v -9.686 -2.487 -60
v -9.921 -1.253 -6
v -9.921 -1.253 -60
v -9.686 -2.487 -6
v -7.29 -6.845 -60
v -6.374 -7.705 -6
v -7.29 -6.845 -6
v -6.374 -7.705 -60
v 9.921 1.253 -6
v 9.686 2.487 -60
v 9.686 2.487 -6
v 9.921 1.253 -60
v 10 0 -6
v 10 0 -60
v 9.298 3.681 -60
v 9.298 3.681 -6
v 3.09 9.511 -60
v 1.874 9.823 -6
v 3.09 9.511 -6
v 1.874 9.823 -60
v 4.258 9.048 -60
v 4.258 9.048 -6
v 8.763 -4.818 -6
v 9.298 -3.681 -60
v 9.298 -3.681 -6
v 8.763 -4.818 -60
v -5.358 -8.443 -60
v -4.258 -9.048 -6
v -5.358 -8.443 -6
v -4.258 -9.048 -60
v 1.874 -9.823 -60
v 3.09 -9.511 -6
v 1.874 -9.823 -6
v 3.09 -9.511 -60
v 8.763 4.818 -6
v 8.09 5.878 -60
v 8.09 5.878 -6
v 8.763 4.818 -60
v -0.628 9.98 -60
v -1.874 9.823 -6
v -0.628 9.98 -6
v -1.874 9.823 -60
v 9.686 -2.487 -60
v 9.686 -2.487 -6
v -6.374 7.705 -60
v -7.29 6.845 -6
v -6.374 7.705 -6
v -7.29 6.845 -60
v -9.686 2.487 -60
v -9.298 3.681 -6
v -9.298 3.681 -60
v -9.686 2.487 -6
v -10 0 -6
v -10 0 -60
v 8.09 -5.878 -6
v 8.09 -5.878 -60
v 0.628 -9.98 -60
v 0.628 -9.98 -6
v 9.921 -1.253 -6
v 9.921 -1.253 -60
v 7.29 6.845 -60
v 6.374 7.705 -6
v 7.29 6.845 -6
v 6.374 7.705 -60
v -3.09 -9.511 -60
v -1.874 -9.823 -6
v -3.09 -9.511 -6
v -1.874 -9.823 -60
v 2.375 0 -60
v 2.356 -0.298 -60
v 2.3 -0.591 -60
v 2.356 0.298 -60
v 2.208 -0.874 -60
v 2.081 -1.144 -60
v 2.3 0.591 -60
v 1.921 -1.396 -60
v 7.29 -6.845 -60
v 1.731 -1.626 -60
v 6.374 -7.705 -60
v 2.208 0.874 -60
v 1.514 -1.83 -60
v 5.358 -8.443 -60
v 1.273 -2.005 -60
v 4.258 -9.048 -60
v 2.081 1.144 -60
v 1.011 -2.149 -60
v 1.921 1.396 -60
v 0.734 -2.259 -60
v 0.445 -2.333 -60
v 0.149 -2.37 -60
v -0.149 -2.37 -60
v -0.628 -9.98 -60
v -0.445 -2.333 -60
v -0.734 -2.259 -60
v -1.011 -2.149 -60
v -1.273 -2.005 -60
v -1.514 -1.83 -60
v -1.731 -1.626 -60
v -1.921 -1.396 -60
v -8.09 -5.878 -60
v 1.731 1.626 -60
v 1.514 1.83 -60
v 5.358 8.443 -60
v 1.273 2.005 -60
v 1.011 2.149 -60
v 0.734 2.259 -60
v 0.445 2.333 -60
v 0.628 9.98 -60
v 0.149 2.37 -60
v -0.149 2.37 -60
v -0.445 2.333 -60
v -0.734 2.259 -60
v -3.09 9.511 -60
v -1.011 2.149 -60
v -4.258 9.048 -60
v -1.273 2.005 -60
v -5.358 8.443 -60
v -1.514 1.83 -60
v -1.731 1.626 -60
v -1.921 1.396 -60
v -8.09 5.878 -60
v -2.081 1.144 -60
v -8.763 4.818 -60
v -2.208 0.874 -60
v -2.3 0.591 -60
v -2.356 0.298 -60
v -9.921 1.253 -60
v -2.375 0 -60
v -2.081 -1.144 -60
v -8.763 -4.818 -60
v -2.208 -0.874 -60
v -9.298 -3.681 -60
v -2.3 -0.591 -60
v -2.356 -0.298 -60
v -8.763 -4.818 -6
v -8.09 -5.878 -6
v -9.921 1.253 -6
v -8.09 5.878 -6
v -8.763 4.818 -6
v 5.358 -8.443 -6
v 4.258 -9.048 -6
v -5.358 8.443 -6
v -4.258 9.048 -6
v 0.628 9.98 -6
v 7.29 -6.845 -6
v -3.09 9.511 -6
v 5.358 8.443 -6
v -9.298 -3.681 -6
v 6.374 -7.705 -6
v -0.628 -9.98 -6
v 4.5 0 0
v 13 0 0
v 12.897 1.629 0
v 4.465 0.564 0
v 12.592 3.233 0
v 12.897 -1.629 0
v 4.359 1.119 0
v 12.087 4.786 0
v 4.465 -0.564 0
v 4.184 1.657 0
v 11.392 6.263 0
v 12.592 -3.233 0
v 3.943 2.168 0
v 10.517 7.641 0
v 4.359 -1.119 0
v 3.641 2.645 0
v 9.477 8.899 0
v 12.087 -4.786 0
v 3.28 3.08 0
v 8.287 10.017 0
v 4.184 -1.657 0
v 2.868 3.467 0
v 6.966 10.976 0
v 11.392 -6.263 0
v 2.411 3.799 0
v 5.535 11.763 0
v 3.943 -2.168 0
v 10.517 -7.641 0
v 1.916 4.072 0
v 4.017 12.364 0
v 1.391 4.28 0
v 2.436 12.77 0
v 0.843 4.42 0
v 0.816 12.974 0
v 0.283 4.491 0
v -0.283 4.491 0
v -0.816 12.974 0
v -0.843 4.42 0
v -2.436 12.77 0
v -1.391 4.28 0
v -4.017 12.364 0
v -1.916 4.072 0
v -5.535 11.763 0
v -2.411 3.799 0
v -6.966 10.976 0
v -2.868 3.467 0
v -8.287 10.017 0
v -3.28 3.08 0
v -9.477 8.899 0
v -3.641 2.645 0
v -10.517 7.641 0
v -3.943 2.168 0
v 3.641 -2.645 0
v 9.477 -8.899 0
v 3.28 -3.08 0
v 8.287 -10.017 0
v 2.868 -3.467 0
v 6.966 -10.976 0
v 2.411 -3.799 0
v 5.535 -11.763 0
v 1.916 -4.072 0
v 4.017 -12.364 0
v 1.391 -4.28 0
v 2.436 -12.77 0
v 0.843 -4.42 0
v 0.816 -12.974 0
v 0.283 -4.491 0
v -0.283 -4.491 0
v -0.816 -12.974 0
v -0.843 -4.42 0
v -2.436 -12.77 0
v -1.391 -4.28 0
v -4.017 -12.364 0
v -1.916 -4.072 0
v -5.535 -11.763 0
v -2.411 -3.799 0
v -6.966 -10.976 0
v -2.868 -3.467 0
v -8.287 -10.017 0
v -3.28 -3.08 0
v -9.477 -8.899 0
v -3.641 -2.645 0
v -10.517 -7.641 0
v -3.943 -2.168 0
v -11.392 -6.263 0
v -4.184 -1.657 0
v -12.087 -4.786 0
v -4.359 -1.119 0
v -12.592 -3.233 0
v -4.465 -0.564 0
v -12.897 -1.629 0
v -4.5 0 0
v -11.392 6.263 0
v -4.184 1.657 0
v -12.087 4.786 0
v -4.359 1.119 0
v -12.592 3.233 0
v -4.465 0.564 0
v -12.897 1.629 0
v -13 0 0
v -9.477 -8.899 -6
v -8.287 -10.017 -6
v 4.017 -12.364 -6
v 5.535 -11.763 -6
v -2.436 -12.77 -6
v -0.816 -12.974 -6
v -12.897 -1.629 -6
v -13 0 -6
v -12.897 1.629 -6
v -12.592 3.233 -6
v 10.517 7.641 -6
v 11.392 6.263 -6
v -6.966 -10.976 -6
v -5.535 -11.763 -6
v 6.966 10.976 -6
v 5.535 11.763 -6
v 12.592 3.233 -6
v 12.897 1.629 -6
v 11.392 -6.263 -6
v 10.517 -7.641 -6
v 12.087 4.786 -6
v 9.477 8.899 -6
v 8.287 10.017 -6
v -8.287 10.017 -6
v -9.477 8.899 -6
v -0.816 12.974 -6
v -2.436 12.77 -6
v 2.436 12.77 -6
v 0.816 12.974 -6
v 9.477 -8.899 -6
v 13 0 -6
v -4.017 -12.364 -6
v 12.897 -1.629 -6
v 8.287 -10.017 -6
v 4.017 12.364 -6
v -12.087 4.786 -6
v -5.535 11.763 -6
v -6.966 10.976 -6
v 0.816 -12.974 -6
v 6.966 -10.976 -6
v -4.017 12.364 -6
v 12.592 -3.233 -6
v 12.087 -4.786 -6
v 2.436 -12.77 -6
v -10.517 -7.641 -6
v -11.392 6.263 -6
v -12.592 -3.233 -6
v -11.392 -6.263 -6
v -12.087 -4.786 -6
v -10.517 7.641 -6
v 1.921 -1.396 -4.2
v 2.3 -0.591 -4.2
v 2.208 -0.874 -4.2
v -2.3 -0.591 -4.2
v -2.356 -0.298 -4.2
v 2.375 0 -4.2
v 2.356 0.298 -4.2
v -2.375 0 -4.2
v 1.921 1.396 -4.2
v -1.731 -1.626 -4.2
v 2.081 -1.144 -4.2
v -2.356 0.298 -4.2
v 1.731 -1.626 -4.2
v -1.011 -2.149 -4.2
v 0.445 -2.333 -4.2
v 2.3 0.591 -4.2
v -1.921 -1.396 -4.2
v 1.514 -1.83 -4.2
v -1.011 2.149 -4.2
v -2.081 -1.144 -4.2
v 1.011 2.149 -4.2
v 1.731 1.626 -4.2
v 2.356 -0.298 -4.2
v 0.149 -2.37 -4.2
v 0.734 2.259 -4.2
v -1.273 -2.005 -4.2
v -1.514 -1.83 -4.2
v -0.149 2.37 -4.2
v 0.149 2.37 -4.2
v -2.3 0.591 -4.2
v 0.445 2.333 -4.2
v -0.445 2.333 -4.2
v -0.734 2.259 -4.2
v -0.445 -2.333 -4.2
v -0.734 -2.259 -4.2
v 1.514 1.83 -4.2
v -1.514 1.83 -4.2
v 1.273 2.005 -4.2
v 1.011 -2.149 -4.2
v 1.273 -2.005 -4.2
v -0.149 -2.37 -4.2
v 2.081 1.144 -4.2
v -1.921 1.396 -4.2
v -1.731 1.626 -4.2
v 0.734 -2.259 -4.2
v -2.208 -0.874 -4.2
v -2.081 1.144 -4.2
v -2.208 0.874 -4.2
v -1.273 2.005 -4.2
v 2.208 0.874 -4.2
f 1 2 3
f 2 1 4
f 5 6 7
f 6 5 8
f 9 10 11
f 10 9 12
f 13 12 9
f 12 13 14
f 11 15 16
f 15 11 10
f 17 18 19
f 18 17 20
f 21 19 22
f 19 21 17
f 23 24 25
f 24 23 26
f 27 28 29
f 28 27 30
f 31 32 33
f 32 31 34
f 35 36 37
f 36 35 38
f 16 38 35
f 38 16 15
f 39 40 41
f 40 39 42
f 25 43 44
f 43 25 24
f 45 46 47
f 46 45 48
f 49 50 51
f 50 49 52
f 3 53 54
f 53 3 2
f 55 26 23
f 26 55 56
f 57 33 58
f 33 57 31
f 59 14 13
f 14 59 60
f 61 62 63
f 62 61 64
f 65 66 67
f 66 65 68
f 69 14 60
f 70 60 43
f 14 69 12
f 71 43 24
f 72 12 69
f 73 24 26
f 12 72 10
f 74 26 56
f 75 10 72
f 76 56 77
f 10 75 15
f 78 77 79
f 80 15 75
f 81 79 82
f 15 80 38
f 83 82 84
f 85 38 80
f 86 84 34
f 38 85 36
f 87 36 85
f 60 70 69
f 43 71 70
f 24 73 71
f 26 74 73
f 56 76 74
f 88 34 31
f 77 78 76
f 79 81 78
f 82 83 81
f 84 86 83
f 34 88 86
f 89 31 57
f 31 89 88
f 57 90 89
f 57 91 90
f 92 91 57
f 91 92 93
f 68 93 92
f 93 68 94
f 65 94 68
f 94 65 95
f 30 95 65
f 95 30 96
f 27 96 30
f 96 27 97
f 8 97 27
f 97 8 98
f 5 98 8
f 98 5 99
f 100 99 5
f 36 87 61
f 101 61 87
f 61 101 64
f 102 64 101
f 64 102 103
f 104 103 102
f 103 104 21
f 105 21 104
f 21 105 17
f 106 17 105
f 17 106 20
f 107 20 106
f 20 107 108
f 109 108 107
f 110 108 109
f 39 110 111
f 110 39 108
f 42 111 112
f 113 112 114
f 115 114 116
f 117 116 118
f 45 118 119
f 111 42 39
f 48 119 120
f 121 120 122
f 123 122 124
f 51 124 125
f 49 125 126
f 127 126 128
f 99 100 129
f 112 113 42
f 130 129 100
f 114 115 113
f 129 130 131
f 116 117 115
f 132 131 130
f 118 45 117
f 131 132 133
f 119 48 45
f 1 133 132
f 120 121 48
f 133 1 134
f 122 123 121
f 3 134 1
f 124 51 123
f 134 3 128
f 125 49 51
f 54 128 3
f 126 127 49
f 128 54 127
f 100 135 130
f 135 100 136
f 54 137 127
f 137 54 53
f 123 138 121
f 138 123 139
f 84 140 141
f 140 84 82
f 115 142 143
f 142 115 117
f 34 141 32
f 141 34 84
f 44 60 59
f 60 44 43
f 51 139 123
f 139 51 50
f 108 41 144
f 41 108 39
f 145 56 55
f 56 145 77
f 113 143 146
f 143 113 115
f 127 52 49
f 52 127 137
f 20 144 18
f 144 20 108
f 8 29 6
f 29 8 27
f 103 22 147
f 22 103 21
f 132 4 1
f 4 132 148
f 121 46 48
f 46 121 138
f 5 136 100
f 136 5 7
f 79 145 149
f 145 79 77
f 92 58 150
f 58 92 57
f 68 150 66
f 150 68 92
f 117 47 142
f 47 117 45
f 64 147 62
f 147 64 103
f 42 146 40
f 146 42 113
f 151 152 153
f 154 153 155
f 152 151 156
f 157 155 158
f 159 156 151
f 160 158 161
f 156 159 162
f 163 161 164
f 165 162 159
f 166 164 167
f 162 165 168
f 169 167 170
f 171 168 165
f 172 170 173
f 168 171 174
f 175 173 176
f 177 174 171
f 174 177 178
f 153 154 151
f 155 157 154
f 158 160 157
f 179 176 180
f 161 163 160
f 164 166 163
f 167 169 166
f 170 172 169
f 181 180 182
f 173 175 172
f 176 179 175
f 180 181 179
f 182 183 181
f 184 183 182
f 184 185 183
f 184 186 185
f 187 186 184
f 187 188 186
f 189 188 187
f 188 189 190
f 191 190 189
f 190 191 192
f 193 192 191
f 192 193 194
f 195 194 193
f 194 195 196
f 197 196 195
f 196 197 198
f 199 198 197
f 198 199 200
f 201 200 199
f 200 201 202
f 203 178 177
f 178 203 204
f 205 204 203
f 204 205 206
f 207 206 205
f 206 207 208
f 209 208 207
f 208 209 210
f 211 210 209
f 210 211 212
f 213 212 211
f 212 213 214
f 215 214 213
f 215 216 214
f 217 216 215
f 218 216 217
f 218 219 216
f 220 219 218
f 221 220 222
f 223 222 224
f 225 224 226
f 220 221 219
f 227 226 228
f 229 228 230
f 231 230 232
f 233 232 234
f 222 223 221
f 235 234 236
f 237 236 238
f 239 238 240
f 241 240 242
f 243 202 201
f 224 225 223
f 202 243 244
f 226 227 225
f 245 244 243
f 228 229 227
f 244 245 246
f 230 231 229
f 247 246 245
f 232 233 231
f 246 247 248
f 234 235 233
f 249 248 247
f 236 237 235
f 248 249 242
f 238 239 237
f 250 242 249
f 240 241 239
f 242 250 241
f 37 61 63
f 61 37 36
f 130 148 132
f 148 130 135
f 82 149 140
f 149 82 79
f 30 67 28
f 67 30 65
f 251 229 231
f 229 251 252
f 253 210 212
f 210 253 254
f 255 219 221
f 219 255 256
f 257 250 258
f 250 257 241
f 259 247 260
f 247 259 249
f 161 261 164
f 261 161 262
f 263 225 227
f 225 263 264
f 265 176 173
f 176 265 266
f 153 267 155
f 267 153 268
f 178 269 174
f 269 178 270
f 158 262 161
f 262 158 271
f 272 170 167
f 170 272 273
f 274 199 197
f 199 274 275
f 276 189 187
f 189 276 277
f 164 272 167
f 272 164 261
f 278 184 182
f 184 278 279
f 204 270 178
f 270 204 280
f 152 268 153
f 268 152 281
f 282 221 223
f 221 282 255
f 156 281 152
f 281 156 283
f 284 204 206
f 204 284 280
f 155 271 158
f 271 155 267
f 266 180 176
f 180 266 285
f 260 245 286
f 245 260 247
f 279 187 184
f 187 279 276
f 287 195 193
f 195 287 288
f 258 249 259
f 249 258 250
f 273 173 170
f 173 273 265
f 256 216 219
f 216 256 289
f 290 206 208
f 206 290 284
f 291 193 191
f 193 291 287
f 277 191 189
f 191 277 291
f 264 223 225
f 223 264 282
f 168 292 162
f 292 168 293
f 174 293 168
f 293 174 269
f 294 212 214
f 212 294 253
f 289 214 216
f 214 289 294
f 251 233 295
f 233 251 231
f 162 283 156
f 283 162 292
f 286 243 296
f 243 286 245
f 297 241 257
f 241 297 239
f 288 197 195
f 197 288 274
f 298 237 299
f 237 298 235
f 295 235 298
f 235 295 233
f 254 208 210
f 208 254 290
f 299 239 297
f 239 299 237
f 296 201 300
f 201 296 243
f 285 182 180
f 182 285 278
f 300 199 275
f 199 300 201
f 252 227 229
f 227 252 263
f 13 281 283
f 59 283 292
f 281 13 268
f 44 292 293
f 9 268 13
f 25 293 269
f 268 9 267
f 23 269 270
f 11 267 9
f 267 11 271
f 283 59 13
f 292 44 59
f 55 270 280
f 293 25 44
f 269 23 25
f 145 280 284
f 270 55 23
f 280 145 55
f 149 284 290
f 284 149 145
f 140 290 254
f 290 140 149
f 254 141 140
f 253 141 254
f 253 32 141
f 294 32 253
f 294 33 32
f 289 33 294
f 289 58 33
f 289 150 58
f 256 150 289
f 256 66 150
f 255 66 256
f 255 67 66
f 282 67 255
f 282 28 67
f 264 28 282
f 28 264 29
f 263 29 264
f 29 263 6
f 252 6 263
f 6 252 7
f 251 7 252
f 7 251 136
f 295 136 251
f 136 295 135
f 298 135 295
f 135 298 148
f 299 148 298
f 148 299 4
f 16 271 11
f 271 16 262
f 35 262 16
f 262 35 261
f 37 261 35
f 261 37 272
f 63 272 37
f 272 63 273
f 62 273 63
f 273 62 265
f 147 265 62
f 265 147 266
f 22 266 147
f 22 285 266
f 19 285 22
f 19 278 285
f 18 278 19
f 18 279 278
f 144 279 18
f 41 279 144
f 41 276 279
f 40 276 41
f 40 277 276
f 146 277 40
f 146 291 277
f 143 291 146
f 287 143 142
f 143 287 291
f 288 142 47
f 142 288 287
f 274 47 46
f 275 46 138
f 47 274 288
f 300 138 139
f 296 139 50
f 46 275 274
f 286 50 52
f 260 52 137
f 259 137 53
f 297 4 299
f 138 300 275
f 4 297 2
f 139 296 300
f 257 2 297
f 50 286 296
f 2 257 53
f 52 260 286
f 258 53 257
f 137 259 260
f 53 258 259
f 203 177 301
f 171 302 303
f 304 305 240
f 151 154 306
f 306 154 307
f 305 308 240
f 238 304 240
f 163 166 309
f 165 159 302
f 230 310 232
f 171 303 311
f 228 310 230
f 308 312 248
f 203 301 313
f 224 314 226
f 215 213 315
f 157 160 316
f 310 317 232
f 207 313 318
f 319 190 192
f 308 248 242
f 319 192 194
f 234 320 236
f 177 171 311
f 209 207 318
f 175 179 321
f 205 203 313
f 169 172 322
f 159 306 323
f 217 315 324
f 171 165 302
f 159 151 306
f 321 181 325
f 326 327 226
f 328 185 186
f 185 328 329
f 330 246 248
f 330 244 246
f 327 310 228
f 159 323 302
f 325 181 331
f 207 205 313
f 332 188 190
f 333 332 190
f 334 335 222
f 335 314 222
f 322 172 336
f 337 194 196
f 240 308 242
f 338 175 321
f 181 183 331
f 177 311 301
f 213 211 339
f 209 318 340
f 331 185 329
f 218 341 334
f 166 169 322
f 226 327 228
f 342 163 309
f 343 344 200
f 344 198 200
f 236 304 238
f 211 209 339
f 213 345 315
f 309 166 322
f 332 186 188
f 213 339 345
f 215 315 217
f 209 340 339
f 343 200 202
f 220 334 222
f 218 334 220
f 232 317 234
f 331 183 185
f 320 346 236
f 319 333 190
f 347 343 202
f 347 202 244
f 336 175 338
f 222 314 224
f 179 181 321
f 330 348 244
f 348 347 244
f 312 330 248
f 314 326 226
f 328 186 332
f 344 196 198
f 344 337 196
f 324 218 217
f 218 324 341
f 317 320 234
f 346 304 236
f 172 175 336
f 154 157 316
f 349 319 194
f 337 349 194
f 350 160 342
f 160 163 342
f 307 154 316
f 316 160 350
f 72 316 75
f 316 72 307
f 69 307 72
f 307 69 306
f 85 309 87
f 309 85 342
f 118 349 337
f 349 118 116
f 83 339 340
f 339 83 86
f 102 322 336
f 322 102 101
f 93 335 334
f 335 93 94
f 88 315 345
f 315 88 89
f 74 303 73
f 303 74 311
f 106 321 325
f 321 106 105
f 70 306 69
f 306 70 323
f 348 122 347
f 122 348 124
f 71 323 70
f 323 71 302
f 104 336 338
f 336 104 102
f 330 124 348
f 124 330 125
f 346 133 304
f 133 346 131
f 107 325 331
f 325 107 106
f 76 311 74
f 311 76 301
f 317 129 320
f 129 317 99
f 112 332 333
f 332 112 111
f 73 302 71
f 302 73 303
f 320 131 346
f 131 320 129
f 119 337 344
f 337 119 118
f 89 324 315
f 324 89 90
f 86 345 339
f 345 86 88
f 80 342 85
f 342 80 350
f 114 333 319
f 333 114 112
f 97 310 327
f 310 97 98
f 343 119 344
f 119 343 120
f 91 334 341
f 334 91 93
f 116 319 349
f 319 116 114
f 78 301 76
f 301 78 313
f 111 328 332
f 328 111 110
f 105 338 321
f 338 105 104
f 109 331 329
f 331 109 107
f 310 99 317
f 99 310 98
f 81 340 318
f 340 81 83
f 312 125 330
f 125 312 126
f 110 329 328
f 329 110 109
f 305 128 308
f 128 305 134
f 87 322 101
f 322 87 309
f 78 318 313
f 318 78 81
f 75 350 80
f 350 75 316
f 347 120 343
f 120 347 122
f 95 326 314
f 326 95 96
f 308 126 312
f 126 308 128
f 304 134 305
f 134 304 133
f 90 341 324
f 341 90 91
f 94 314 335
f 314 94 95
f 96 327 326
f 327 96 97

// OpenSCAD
$fn = 50;


difference() {
	union() {
		translate(v = [0, 0, -60.0000000000]) {
			cylinder(h = 60, r = 10.0000000000);
		}
		translate(v = [0, 0, -6.0000000000]) {
			cylinder(h = 6, r = 13.0000000000);
		}
	}
	union() {
		translate(v = [0, 0, 0]) {
			rotate(a = [0, 0, 0]) {
				difference() {
					union() {
						#translate(v = [0, 0, -60.0000000000]) {
							cylinder(h = 60, r = 2.2500000000);
						}
						#translate(v = [0, 0, -4.2000000000]) {
							cylinder(h = 4.2000000000, r = 10.0000000000, r1 = 2.3750000000, r2 = 4.5000000000);
						}
						#translate(v = [0, 0, -60.0000000000]) {
							cylinder(h = 60, r = 2.3750000000);
						}
						#translate(v = [0, 0, -60.0000000000]) {
							cylinder(h = 60, r = 2.2500000000);
						}
					}
					union();
				}
			}
		}
	}
}
